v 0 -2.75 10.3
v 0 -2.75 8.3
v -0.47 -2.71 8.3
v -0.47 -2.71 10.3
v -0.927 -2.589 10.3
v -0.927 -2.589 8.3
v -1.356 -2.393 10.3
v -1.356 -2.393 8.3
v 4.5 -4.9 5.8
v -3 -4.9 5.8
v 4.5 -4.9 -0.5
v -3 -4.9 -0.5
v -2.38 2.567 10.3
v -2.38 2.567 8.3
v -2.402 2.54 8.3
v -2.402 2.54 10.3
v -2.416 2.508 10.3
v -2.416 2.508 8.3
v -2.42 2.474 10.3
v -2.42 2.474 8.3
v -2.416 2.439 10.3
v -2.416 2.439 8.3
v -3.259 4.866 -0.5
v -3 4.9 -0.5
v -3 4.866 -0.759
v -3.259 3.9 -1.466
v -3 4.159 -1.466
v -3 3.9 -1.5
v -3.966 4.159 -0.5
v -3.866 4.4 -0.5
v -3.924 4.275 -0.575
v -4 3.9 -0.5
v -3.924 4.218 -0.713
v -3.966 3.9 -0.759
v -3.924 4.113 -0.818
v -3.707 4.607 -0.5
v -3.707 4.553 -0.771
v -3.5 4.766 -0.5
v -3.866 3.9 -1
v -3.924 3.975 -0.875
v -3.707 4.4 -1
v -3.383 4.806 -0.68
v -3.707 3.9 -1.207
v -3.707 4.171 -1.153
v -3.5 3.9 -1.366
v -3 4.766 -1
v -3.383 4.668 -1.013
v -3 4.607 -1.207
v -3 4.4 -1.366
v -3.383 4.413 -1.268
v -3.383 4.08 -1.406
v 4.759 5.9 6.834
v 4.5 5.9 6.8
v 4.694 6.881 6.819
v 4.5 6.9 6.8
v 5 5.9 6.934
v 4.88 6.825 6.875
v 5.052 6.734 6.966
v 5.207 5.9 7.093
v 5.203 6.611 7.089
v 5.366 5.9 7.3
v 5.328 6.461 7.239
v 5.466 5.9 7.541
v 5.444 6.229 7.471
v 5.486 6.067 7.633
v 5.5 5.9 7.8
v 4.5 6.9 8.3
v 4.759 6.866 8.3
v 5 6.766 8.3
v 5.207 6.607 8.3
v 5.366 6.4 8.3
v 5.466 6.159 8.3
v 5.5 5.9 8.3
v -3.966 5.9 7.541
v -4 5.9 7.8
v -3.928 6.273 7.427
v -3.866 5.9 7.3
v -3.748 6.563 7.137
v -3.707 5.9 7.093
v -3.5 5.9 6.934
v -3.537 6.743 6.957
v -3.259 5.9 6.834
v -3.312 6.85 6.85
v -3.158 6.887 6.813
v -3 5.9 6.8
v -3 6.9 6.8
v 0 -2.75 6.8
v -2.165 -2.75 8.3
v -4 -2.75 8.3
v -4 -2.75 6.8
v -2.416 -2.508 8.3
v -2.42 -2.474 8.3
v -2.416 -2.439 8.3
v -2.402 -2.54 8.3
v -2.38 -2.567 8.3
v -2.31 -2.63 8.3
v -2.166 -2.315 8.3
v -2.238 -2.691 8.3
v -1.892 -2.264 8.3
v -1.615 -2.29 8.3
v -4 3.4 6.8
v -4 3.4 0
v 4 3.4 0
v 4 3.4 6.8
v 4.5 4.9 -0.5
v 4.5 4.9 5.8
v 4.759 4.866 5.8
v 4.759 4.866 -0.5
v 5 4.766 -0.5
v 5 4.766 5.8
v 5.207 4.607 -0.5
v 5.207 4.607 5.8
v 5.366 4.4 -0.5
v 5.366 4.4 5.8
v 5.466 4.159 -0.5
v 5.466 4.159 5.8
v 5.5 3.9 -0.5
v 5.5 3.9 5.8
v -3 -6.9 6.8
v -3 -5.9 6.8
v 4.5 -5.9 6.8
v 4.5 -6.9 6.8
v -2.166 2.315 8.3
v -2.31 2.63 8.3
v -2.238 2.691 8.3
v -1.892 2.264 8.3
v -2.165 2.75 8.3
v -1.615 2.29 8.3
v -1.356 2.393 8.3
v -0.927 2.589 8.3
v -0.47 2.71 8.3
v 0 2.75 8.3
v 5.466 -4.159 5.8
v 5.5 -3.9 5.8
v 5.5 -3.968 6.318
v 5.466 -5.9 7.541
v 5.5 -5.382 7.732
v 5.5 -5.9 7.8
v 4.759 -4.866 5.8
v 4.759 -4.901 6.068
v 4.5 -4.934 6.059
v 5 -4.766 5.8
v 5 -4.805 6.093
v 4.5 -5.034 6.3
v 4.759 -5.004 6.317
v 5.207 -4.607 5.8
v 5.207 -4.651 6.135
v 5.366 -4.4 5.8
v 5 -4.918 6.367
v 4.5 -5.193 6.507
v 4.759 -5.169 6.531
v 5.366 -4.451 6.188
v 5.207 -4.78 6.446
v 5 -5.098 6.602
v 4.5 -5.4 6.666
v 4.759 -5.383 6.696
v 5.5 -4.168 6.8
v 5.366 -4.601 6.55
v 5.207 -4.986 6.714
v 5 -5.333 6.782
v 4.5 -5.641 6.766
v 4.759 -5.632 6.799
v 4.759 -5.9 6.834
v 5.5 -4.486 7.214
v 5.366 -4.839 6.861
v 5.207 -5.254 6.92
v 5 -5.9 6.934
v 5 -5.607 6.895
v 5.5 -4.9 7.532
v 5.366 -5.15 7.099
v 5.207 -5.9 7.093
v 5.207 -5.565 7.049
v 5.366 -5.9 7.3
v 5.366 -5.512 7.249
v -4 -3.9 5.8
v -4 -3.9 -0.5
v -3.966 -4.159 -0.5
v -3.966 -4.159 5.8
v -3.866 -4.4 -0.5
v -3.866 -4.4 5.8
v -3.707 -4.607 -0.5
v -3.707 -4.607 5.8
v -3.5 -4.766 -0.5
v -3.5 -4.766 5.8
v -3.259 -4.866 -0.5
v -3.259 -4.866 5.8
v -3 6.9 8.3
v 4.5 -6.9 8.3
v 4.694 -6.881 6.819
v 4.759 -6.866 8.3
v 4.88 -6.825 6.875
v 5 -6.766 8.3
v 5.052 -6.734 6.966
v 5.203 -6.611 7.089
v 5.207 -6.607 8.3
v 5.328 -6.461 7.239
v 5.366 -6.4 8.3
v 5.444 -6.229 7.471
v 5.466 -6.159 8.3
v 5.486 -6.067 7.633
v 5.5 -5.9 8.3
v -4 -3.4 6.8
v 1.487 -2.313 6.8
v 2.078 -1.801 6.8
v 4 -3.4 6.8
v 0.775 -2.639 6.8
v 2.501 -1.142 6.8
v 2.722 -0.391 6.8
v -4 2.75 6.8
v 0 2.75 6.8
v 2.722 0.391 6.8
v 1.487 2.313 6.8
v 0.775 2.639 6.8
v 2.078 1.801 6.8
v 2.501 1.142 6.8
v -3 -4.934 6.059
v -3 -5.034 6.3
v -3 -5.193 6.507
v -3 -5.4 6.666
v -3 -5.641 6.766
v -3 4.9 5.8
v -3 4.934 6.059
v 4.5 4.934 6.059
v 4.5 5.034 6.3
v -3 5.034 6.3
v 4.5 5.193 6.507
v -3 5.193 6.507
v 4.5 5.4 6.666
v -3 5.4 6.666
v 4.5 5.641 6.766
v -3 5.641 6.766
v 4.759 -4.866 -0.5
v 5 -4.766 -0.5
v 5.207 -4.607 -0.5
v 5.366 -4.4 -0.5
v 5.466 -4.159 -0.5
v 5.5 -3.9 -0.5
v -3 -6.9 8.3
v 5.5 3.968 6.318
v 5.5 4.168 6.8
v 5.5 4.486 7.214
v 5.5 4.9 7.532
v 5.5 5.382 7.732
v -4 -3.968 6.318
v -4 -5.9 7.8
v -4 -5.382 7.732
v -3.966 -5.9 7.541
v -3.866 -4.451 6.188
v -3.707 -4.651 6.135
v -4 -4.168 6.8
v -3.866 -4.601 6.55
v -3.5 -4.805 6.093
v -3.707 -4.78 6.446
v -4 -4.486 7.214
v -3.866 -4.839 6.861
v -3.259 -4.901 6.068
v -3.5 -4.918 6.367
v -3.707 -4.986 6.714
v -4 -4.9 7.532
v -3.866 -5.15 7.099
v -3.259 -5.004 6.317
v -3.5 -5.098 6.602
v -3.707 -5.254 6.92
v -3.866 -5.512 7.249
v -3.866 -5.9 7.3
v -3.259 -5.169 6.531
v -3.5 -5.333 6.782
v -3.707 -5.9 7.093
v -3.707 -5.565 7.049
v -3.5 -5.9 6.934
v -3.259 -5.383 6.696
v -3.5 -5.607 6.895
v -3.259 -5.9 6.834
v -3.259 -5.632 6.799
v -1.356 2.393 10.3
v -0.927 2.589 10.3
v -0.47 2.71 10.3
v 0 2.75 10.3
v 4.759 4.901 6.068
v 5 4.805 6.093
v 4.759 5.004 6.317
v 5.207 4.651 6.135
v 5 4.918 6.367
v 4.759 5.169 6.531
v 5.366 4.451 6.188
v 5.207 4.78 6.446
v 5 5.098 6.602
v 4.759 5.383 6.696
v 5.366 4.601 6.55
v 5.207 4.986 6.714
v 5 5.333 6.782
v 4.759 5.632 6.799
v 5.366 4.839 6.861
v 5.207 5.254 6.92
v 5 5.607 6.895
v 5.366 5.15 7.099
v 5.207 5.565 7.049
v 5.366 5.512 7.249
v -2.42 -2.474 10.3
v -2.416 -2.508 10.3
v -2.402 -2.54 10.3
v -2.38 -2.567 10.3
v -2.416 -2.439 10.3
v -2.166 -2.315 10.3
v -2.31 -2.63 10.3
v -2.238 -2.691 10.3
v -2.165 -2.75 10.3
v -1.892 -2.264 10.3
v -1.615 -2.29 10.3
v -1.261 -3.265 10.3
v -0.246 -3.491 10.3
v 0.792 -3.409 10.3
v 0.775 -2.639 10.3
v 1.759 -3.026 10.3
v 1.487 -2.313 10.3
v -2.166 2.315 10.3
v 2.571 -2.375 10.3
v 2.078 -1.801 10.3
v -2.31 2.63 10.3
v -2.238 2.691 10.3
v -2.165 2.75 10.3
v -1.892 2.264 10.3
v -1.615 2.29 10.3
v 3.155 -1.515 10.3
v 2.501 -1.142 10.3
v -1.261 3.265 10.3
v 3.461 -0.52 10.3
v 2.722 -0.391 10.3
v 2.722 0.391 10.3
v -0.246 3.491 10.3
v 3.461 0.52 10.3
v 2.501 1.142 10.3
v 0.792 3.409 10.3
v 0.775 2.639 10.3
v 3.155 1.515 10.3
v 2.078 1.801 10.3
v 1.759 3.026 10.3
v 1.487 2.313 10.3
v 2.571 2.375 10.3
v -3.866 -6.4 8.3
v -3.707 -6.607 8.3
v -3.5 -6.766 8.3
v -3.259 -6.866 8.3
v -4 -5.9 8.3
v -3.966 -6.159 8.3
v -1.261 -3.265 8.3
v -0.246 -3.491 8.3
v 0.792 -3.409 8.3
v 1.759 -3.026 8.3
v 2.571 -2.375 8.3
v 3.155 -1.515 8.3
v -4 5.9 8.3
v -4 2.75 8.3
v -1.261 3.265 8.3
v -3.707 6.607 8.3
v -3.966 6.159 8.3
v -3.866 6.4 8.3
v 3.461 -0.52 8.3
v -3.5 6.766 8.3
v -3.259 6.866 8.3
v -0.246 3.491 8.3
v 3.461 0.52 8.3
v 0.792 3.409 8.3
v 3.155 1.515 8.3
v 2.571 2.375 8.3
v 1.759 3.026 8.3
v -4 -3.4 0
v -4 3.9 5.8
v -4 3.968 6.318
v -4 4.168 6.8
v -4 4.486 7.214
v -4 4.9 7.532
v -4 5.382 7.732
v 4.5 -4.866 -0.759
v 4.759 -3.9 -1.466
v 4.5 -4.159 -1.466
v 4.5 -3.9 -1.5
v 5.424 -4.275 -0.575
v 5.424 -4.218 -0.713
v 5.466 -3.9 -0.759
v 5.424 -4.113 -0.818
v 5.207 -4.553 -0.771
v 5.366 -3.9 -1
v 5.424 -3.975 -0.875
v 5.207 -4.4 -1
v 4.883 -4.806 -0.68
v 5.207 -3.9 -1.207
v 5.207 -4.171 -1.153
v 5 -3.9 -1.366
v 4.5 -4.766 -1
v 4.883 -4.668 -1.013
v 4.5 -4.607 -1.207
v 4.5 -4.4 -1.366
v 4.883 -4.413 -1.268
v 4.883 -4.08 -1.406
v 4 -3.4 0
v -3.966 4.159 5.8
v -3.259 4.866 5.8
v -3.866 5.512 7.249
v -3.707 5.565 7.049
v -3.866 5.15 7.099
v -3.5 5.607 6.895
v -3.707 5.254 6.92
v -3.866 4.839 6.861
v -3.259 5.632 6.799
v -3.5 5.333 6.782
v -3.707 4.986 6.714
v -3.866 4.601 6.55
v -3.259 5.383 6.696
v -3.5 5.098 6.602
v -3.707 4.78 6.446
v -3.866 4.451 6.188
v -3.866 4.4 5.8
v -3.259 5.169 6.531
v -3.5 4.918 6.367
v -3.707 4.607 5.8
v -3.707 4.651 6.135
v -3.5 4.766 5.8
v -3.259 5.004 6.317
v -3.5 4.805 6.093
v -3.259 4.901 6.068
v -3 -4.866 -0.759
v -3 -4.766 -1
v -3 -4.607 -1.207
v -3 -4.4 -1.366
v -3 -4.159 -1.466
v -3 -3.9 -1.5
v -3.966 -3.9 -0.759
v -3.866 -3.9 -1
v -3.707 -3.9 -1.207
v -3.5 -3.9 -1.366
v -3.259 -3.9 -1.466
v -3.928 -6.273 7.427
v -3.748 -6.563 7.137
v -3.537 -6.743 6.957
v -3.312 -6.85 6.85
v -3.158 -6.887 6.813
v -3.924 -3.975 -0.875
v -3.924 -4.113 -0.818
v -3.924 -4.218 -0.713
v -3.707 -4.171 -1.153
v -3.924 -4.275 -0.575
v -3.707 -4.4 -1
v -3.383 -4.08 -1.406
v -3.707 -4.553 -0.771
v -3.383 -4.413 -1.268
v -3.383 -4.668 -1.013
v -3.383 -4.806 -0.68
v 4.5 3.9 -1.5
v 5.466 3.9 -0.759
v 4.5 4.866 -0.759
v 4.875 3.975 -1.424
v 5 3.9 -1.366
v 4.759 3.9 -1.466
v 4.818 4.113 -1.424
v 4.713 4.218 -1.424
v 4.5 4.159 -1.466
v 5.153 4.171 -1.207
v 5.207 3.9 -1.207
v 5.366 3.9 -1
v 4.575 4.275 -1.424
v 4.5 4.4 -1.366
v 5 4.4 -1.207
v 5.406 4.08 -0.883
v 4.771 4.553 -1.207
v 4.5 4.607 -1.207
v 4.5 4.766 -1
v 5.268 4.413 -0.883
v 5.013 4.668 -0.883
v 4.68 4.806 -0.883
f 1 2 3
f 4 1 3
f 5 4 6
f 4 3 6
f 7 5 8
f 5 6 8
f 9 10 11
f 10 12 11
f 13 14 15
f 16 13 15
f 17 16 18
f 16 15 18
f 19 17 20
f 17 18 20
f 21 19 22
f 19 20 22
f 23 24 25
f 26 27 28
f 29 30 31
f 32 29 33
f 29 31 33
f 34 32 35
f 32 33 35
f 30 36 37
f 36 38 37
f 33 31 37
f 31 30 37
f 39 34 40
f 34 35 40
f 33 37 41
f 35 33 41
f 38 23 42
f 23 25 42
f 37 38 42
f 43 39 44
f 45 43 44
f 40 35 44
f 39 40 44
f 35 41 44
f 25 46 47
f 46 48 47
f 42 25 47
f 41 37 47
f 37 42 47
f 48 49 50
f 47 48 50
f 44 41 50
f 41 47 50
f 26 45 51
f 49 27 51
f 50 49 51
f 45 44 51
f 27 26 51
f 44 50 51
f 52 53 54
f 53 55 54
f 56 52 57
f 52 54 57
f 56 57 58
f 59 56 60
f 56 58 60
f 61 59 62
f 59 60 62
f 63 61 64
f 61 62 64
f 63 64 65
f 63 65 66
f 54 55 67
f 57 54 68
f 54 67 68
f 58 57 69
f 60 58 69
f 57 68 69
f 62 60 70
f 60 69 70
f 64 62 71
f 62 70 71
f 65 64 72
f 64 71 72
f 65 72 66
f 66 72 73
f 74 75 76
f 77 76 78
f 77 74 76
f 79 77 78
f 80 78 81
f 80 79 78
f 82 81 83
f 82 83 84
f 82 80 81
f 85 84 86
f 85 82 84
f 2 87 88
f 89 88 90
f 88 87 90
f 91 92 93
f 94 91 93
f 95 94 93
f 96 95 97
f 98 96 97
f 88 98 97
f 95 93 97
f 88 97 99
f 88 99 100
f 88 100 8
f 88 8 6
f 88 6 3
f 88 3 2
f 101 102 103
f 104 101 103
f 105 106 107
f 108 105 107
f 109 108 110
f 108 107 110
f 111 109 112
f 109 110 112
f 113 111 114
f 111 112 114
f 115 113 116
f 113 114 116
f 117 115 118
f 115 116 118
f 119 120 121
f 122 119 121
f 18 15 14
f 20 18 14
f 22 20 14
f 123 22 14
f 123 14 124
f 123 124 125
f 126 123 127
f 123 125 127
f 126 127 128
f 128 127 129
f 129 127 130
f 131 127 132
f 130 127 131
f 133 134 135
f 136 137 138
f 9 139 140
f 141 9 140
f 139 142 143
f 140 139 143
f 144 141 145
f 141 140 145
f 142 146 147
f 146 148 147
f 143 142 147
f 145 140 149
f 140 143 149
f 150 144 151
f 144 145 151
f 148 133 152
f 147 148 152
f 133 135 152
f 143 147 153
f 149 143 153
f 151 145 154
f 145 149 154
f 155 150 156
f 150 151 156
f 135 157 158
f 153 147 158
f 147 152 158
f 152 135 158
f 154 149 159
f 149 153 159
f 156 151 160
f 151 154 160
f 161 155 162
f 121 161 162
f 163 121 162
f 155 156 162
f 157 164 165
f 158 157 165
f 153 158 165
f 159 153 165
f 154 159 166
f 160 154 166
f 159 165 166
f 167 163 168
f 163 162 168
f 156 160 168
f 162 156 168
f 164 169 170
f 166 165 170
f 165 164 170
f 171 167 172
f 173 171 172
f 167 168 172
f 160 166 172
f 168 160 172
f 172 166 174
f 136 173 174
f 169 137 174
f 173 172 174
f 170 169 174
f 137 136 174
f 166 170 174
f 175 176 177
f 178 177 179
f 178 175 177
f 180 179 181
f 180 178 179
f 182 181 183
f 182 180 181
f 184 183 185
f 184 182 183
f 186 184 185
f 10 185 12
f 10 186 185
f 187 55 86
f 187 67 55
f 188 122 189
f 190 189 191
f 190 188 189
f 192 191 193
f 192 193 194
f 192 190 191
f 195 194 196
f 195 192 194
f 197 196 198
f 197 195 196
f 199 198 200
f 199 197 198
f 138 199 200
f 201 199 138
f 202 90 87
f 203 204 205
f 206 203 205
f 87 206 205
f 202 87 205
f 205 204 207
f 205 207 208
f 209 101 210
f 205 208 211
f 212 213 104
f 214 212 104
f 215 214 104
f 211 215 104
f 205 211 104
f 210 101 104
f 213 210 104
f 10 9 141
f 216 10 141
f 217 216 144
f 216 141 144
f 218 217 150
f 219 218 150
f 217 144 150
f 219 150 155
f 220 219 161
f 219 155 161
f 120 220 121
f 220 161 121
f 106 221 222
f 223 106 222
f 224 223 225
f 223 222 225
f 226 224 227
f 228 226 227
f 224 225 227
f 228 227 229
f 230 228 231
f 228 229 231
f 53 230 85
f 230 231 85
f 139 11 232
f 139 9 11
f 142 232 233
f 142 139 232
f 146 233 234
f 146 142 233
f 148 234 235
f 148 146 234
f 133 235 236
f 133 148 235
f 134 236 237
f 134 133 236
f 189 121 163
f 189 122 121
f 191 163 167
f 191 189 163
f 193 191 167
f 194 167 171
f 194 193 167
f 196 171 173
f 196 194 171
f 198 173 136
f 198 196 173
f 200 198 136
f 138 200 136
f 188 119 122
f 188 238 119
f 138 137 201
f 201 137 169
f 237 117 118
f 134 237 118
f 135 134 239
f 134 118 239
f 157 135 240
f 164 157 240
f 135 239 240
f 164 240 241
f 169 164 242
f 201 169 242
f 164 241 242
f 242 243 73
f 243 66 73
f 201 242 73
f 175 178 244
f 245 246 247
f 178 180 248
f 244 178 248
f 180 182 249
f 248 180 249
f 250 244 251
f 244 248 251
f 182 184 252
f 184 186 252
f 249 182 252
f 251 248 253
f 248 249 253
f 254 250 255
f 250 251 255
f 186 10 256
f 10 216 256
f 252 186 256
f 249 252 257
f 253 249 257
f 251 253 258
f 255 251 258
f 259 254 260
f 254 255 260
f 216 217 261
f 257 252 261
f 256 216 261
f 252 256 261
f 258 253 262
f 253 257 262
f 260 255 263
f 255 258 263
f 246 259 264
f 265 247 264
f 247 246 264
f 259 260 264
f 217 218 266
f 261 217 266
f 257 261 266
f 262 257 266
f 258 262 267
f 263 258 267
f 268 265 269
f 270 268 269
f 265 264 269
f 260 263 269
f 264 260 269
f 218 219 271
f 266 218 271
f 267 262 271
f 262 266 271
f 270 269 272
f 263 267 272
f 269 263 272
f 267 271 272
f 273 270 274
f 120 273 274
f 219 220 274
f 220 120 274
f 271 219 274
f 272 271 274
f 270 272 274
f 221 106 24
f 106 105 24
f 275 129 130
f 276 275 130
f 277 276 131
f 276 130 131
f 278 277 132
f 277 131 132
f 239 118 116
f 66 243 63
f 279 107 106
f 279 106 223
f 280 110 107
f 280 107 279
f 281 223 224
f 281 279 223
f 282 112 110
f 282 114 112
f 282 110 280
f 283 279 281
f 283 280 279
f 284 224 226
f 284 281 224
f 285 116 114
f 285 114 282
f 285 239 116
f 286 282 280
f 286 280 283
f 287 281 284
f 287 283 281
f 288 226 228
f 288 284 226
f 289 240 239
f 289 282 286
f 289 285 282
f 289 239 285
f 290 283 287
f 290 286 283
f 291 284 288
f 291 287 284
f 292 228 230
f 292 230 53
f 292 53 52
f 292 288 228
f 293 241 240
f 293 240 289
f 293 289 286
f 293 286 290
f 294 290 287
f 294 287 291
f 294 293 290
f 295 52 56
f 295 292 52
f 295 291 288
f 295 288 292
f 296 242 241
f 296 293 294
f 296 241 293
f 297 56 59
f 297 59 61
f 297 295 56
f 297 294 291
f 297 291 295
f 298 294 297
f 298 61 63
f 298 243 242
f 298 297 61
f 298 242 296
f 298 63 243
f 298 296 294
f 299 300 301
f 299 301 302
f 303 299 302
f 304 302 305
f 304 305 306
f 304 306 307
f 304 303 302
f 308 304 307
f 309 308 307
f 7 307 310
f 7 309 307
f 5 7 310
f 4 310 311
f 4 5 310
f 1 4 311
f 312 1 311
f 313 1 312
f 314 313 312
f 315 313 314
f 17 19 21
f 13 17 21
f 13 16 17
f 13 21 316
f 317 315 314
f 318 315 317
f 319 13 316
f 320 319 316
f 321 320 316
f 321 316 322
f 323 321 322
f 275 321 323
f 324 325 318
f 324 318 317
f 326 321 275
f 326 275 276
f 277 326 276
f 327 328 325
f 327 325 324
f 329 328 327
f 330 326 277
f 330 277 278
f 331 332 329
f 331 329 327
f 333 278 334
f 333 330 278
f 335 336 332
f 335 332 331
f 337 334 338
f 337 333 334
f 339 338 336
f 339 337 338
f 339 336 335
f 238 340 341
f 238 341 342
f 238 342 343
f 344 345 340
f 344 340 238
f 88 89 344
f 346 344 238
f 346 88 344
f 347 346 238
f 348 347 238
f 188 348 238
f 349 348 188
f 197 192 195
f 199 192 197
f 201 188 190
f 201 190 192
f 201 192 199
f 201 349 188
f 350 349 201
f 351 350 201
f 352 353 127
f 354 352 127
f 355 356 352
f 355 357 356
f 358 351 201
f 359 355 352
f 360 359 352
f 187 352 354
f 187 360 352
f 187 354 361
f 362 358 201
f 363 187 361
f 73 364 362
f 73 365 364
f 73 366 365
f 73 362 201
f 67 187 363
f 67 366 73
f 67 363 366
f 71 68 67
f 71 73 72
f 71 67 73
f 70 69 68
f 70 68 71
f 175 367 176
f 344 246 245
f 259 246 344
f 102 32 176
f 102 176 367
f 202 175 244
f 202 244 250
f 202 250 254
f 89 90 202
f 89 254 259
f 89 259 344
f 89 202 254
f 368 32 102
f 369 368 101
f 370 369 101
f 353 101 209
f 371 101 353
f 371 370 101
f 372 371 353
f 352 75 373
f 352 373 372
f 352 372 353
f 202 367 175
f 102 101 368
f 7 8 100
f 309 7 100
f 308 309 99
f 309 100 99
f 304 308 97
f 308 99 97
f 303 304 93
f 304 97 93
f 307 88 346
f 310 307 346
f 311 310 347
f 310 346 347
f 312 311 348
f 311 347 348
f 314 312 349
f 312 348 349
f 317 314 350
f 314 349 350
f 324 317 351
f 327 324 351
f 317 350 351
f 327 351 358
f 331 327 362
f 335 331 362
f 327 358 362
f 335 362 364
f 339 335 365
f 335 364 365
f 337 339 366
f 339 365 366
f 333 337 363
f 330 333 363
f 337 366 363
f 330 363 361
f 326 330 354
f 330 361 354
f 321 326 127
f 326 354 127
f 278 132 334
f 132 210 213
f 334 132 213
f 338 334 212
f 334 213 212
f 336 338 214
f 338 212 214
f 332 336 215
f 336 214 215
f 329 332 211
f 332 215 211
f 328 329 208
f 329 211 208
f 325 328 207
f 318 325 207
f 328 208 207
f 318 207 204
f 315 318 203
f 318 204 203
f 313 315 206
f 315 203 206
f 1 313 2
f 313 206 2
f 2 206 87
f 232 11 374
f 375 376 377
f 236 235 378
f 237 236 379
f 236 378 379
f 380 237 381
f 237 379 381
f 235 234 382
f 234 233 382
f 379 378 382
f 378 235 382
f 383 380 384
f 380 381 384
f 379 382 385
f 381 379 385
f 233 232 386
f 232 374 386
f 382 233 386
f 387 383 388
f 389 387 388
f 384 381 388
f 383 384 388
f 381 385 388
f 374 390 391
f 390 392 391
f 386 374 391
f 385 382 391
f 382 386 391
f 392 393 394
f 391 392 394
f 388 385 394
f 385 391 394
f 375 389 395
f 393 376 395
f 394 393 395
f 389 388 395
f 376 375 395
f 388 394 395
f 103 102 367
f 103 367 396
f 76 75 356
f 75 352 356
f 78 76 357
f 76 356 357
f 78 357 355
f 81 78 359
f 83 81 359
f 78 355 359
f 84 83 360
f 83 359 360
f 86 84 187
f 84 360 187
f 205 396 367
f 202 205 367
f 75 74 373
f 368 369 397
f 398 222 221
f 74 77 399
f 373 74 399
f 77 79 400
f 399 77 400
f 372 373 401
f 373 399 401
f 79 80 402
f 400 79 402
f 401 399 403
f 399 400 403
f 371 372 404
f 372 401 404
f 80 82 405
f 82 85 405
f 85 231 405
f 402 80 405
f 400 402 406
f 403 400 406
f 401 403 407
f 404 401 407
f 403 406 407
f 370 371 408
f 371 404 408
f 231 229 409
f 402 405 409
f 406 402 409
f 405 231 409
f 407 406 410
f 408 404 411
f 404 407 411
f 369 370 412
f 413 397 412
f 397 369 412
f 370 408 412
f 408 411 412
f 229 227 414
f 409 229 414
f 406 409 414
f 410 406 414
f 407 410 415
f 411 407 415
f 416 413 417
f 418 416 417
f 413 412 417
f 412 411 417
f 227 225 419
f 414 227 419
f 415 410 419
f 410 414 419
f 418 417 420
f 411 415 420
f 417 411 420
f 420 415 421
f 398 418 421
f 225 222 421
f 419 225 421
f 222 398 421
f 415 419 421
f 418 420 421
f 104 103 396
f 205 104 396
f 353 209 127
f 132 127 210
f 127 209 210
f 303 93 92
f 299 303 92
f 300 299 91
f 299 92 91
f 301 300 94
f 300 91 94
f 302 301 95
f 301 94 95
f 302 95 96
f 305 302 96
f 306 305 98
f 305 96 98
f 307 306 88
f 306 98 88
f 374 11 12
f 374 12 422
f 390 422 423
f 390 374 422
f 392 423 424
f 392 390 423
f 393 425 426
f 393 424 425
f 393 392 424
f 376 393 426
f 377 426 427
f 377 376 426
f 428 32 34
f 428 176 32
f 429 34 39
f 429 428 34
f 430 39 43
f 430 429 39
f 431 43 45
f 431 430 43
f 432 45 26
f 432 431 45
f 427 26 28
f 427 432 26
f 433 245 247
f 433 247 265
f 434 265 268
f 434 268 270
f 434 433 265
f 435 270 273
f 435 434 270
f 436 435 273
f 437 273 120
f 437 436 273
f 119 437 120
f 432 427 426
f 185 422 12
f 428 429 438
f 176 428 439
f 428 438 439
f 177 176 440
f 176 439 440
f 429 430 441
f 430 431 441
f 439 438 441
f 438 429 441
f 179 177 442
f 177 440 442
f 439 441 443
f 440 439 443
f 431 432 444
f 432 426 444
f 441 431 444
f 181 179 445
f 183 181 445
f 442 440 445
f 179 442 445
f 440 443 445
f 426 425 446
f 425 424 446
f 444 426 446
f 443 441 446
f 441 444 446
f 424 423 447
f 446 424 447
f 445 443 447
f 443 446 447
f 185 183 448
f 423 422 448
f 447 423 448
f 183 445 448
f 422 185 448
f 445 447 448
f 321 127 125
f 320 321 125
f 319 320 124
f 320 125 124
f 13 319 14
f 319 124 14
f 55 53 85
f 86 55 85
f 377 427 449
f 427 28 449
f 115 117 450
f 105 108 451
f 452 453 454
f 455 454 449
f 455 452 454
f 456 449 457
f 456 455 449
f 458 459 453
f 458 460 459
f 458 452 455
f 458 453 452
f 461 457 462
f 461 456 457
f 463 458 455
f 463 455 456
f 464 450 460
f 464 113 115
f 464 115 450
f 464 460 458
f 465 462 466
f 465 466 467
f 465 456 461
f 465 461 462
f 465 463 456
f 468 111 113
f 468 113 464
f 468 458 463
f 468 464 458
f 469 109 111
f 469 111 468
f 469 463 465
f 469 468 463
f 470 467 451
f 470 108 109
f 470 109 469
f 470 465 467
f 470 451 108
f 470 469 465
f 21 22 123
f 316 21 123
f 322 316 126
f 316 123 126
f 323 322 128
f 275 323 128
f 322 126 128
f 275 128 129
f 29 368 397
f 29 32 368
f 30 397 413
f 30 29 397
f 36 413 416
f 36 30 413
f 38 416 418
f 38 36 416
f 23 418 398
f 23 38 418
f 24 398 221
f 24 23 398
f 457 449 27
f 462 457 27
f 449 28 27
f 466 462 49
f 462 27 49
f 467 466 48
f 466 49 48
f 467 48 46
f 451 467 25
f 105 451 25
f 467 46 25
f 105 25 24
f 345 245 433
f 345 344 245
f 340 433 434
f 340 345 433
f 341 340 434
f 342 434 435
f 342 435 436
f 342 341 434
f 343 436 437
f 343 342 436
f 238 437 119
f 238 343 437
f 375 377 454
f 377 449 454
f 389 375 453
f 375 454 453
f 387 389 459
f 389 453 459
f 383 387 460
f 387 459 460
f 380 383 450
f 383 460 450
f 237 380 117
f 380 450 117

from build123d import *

# Parameters (mm, degrees)
F0_W      = 8
F0_H      = 6.8
F1_DEPTH  = 1.5
F2_DEPTH  = 6.8
F4_DEPTH  = 1.5
F6_DEPTH  = 2
F7_W      = 9.5
F7_H      = 1.5
F8_DEPTH  = 2
F9_W      = 9.5
F9_H      = 1.5
F10_DEPTH = 2
F11_F1_R  = 1
F11_F2_R  = 1


with BuildPart() as f1:
    # F0 (on Top) → F1 (new body)
    with BuildSketch(Plane.XY):
        Polygon((4, 3.4), (4, -3.4), (-4, -3.4), (-4, -4.9), (5.5, -4.9), (5.5, 4.9), (-4, 4.9), (-4, 3.4), align=None)
        Rectangle(F0_W, F0_H)
    extrude(amount=-F1_DEPTH)

    # F0 (on Top) → F2 (join)
    with BuildSketch(Plane.XY):
        Polygon((4, 3.4), (4, -3.4), (-4, -3.4), (-4, -4.9), (5.5, -4.9), (5.5, 4.9), (-4, 4.9), (-4, 3.4), align=None)
    extrude(amount=F2_DEPTH)

    # F3 (on face) → F4 (join)
    with BuildSketch(Plane.XY.offset(6.8)):
        with BuildLine():
            ThreePointArc((0, 2.75), (2.75, 0), (0, -2.75))
            Line((0, -2.75), (-4, -2.75))
            Line((-4, -2.75), (-4, -3.4))
            Line((-4, -3.4), (4, -3.4))
            Line((4, -3.4), (4, 3.4))
            Line((4, 3.4), (-4, 3.4))
            Line((-4, 3.4), (-4, 2.75))
            Line((-4, 2.75), (0, 2.75))
        make_face()
        Polygon((4, -3.4), (-4, -3.4), (-4, -4.9), (5.5, -4.9), (5.5, 4.9), (-4, 4.9), (-4, 3.4), (4, 3.4), align=None)
    extrude(amount=F4_DEPTH)

    # F5 (on face) → F6 (join)
    with BuildSketch(Plane.XY.offset(8.3)):
        with BuildLine():
            ThreePointArc((0, 2.75), (2.75, 0), (0, -2.75))
            Line((0, -2.75), (-2.1650635095, -2.75))
            ThreePointArc((-2.1650635095, -2.75), (3.5, 0), (-2.1650635095, 2.75))
            Line((-2.1650635095, 2.75), (0, 2.75))
        make_face()
        with BuildLine():
            ThreePointArc((-1.3555844547, 2.3926744004), (-0.7009441486, 2.6591685356), (0, 2.75))
            Line((0, 2.75), (-2.1650635095, 2.75))
            ThreePointArc((-2.1650635095, 2.75), (-2.2741617405, 2.6604864928), (-2.3795628172, 2.5666477747))
            ThreePointArc((-2.3795628172, 2.5666477747), (-2.4155229026, 2.507985001), (-2.4157537689, 2.4391780576))
            ThreePointArc((-2.4157537689, 2.4391780576), (-1.8923464861, 2.2636984741), (-1.3555844547, 2.3926744004))
        make_face()
        with BuildLine():
            ThreePointArc((0, -2.75), (-0.7009441486, -2.6591685356), (-1.3555844547, -2.3926744004))
            ThreePointArc((-1.3555844547, -2.3926744004), (-1.8923464861, -2.2636984741), (-2.4157537689, -2.4391780576))
            ThreePointArc((-2.4157537689, -2.4391780576), (-2.4155229026, -2.507985001), (-2.3795628172, -2.5666477747))
            ThreePointArc((-2.3795628172, -2.5666477747), (-2.2741617405, -2.6604864928), (-2.1650635095, -2.75))
            Line((-2.1650635095, -2.75), (0, -2.75))
        make_face()
    extrude(amount=F6_DEPTH)

    # F7 (on face) → F8 (join)
    with BuildSketch(Plane(origin=(0, 4.9, 0), x_dir=(-1, 0, 0), z_dir=(0, 1, 0))):
        with Locations((-0.75, 7.55)):
            Rectangle(F7_W, F7_H)
    extrude(amount=F8_DEPTH)

    # F9 (on face) → F10 (join)
    with BuildSketch(Plane.XZ.offset(4.9)):
        with Locations((0.75, 7.55)):
            Rectangle(F9_W, F9_H)
    extrude(amount=F10_DEPTH)

    # F11: fillet of radius 1 on 16 edges, made by hand

    # F11_f1
    f11_f1_edges = [f1.edges().sort_by_distance(p)[0] for p in [
        (0.75, -4.9, 6.8),
        (0.75, 4.9, 6.8),
    ]]
    fillet(f11_f1_edges, radius=F11_F1_R)

    # F11_f2
    f11_f2_edges = [f1.edges().sort_by_distance(p)[0] for p in [
        (0.75, -4.9, -1.5),
        (5.5, -4.9, 2.15),
        (5.5, 4.9, 2.15),
        (5.5, 0, -1.5),
        (0.75, 4.9, -1.5),
        (-4, 4.9, 2.15),
        (-4, 0, -1.5),
        (-4, -4.9, 2.15),
        (-4, 6.9, 7.55),
        (-4, 6.4, 6.8),
        (5.5, 6.9, 7.55),
        (5.5, -6.9, 7.55),
        (-4, -6.9, 7.55),
        (-4, -6.4, 6.8),
        (-4, -5.1928932188, 6.5071067812),
        (-4, 5.1928932188, 6.5071067812),
        (5.5, 5.1928932188, 6.5071067812),
        (5.5, -5.1928932188, 6.5071067812),
    ]]
    fillet(f11_f2_edges, radius=F11_F2_R)


solid = f1.part
